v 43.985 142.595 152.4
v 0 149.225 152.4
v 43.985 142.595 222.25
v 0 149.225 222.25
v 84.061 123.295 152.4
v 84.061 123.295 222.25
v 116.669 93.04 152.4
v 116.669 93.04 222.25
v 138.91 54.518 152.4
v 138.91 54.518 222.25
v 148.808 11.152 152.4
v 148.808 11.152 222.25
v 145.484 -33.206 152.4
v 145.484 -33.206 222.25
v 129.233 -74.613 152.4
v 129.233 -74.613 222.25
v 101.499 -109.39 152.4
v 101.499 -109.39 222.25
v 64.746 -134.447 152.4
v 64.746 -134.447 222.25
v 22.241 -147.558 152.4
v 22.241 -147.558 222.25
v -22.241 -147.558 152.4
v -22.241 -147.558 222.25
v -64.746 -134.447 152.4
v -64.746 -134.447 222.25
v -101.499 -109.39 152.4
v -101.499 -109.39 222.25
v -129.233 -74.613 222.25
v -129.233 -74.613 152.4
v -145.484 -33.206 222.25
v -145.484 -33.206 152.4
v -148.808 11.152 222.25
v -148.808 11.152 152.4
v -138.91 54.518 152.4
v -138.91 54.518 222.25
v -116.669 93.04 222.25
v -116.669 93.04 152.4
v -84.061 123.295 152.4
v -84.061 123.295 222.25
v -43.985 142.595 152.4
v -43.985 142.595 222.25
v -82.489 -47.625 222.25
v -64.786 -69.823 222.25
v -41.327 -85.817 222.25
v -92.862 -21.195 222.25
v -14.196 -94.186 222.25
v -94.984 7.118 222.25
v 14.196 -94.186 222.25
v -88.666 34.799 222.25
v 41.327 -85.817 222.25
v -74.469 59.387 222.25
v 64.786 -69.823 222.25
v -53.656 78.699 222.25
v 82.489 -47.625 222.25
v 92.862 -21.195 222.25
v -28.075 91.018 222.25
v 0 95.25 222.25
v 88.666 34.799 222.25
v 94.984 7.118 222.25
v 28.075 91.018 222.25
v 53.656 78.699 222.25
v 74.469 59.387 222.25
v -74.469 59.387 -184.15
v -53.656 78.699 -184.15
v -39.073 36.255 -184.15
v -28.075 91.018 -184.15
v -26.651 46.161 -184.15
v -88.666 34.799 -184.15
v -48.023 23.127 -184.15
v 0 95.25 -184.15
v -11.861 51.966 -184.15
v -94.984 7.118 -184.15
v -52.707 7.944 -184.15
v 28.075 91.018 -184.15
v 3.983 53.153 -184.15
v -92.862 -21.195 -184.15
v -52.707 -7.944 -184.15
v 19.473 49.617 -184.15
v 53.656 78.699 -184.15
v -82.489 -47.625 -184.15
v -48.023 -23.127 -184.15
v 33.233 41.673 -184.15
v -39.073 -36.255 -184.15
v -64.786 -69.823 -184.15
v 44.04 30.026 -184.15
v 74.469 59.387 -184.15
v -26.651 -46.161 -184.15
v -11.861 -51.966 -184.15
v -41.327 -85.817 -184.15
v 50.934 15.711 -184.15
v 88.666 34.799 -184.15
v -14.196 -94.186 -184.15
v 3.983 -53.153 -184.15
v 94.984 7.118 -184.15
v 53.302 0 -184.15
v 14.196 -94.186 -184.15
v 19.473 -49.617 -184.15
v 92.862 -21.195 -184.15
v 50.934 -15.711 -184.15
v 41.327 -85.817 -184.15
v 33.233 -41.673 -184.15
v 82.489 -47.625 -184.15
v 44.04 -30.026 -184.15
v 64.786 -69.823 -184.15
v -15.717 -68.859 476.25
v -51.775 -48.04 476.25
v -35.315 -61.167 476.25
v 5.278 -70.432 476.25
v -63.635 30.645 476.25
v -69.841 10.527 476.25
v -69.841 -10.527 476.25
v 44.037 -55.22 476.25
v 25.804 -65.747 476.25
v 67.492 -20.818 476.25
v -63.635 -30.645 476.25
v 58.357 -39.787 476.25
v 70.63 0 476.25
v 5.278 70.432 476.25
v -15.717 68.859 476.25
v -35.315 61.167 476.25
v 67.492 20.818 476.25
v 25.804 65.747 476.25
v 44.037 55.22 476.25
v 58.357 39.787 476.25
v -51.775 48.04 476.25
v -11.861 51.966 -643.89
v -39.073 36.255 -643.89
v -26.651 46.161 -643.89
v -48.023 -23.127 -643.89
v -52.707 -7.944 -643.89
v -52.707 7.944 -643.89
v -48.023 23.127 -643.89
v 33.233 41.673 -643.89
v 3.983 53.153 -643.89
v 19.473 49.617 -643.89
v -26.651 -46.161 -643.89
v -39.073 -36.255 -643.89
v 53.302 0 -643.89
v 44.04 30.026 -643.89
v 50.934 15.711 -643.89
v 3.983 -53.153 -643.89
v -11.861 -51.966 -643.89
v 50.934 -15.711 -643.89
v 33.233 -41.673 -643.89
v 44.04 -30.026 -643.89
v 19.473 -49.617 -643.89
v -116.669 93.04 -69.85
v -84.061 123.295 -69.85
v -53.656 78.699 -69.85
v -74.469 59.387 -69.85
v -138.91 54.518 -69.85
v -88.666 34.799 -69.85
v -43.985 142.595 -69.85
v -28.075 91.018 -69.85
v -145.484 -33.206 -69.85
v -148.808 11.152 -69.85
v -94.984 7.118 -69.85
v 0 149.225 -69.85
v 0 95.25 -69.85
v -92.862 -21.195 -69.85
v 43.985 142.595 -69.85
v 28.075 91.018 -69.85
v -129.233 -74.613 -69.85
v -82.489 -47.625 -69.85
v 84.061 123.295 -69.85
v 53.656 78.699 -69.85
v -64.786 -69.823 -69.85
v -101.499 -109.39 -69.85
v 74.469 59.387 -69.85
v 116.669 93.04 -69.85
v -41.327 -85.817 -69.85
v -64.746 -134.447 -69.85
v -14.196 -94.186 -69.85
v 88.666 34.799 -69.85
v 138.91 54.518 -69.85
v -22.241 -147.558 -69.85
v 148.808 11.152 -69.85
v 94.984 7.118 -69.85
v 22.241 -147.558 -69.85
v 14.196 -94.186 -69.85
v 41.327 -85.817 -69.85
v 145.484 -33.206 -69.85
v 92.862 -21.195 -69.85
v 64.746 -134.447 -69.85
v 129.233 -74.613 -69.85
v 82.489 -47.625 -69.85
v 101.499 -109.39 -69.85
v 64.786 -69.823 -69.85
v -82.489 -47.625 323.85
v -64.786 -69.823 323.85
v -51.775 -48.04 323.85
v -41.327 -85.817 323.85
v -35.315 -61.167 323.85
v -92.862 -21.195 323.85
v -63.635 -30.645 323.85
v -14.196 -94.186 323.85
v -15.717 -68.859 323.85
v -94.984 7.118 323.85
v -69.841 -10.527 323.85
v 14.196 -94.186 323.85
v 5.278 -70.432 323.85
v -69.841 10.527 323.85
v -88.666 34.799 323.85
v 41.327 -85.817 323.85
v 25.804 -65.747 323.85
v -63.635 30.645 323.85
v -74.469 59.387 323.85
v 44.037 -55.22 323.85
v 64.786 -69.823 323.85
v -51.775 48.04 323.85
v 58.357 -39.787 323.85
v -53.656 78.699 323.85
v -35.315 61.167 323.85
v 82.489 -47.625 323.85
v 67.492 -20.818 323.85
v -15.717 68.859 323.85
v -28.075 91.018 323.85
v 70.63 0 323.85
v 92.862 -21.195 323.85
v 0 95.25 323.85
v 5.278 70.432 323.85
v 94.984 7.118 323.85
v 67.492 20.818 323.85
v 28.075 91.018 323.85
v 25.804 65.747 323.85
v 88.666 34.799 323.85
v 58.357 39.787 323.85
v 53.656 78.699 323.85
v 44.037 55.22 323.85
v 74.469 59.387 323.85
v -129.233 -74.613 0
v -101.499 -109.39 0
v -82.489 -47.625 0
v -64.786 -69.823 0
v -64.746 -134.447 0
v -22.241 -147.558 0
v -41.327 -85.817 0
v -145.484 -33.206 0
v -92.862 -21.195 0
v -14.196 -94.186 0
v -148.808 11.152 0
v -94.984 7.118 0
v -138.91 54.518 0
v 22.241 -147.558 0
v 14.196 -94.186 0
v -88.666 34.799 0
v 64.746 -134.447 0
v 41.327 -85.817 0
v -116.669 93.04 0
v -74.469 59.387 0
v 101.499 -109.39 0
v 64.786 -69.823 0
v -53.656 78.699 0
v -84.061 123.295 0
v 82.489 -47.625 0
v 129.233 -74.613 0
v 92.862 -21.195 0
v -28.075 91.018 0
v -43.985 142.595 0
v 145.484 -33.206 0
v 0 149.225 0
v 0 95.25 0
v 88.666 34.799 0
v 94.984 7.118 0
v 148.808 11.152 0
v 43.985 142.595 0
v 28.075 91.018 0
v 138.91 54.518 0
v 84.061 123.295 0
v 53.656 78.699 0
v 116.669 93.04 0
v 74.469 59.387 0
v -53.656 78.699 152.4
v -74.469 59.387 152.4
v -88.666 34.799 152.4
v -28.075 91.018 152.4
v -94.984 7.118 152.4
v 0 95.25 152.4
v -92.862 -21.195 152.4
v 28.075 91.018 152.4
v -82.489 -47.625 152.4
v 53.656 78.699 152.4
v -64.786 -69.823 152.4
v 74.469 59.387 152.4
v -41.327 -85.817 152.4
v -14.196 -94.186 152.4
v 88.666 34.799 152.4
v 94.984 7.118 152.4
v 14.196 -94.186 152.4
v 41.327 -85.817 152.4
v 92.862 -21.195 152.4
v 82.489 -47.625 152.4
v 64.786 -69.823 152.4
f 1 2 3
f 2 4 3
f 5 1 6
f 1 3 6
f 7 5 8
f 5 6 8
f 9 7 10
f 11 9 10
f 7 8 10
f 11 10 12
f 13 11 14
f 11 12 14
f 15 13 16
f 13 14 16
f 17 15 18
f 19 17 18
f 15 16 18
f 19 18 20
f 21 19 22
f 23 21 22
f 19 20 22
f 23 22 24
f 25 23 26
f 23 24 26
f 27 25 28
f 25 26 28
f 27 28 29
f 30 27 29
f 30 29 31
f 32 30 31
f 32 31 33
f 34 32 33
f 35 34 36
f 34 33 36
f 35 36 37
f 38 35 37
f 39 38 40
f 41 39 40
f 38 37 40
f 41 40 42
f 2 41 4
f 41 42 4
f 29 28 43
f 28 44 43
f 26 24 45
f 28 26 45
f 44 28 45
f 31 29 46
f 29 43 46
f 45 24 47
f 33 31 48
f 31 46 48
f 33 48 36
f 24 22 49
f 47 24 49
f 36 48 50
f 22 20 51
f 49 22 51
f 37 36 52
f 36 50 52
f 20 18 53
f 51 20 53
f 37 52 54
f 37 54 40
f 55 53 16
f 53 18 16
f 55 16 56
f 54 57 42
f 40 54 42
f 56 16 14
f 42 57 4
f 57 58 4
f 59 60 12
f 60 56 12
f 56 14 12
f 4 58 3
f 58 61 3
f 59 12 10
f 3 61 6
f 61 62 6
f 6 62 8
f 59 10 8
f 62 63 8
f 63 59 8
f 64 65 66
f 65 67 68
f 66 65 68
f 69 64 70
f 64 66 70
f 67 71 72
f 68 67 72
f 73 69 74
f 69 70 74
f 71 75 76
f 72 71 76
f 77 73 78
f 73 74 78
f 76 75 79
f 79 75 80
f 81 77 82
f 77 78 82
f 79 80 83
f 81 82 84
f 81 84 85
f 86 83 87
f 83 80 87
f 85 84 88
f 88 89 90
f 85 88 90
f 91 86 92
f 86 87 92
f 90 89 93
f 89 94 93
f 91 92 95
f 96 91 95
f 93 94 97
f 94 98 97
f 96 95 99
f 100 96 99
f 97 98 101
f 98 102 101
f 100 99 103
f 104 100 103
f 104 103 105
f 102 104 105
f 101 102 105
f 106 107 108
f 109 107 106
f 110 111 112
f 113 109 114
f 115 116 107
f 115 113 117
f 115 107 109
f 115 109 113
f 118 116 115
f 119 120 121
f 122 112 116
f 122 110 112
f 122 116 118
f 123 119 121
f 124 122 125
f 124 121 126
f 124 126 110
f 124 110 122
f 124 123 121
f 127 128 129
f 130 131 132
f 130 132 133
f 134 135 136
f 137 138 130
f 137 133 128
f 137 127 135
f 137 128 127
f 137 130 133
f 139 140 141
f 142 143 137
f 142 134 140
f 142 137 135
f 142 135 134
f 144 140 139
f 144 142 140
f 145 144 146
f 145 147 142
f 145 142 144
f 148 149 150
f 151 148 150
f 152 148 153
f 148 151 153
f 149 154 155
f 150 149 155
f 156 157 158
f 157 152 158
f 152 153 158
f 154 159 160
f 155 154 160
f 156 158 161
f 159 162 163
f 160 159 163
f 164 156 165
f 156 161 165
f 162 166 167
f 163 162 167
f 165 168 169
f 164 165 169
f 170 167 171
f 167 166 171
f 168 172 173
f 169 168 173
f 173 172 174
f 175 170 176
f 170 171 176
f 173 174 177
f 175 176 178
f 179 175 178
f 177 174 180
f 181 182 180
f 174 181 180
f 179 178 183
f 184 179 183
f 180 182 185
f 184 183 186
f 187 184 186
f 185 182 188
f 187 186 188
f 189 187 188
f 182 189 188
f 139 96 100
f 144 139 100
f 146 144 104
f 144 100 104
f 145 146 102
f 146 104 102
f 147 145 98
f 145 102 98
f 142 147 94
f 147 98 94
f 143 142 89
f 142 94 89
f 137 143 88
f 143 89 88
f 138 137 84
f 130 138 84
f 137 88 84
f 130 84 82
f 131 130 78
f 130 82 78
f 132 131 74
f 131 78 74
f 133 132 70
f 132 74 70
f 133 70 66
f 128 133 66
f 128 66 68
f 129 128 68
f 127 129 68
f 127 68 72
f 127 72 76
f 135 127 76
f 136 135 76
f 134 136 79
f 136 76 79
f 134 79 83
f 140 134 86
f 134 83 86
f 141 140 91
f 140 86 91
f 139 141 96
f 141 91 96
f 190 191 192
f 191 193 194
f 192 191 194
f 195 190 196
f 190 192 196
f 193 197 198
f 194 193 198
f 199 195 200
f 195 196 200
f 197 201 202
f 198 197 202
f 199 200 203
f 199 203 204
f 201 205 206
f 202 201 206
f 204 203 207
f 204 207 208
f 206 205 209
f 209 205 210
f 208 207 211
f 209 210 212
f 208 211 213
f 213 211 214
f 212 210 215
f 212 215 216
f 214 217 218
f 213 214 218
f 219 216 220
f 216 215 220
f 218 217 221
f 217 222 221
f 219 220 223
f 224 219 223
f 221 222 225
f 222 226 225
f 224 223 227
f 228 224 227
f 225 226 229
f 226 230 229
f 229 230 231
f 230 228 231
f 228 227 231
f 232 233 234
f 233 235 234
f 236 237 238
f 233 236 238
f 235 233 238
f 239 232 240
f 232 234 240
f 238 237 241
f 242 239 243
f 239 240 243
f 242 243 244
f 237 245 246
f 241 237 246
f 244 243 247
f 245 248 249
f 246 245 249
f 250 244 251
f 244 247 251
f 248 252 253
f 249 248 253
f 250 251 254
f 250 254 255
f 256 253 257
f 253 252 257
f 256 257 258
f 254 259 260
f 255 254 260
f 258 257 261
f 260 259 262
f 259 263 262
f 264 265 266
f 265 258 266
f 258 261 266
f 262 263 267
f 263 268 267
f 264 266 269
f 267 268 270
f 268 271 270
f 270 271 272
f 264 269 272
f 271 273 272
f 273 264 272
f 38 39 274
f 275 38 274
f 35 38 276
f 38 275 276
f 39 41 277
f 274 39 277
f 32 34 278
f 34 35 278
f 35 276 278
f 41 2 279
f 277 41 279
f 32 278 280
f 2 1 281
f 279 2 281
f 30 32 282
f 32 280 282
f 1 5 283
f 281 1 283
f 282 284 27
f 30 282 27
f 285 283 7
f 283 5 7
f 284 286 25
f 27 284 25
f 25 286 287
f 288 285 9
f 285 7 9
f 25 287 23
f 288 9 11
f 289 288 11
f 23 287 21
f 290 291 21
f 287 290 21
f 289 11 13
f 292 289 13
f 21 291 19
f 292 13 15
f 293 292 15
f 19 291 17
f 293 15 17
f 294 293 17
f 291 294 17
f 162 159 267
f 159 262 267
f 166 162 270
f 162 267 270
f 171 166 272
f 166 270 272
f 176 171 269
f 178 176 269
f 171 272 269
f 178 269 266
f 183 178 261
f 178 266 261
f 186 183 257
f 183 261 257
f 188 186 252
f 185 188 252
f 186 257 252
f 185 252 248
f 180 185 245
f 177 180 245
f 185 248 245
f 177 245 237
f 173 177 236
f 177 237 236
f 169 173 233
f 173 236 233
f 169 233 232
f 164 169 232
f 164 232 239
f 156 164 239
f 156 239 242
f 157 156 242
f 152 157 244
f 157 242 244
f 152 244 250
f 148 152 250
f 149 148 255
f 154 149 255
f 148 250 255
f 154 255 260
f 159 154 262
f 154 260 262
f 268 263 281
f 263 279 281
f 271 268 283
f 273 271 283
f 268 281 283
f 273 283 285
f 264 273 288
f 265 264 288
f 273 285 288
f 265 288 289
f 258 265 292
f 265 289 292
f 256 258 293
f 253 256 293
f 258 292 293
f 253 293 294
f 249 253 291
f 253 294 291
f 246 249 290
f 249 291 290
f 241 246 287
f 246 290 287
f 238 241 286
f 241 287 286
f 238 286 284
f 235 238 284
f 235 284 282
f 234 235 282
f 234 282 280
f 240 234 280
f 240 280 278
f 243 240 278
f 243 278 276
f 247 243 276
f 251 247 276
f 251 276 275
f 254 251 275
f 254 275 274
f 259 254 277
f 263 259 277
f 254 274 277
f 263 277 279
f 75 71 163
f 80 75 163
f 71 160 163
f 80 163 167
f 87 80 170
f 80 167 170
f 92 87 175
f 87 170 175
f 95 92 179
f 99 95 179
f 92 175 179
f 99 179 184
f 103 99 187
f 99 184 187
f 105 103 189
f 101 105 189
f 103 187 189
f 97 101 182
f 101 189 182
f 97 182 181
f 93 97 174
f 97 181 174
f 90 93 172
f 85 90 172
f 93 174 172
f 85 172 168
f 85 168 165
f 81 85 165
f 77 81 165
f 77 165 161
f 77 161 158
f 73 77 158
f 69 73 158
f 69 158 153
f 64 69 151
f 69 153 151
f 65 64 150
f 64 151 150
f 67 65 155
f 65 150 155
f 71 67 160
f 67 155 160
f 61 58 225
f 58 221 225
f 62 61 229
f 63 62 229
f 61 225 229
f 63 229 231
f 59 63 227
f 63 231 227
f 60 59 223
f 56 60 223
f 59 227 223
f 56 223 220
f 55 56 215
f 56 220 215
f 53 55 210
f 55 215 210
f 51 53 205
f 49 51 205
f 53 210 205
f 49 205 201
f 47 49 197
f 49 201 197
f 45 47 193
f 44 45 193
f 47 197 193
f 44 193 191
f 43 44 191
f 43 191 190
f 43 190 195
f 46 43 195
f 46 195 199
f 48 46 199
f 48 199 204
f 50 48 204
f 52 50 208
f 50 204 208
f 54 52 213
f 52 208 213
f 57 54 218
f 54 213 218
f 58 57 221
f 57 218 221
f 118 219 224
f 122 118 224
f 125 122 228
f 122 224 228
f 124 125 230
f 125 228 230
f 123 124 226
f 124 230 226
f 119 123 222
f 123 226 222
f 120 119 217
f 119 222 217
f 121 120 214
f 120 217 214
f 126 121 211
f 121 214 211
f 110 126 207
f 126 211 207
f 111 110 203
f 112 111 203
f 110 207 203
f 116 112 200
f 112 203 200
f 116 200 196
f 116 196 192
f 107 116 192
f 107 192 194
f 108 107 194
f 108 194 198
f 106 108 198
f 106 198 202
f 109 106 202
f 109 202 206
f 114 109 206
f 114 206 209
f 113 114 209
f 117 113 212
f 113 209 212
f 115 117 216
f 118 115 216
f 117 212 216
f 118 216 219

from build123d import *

# Parameters (mm, degrees)
F2_R     = 70.629531
F3_DEPTH = 152.4
F4_R     = 53.301947
F5_DEPTH = 459.74


with BuildPart() as f1:
    # F0 (on Right) → F1 (revolve)
    with BuildSketch(Plane.YZ):
        Polygon((95.25, 323.85), (0, 323.85), (0, -184.15), (95.25, -184.15), (95.25, -69.85), (149.225, -69.85), (149.225, 0), (95.25, 0), (95.25, 152.4), (149.225, 152.4), (149.225, 222.25), (95.25, 222.25), align=None)
    revolve(axis=Axis((0, 0, 7.681185), (0, 0, -1)))

    # F2 (on face) → F3 (join)
    with BuildSketch(Plane.XY.offset(323.85)):
        Circle(F2_R)
    extrude(amount=F3_DEPTH)

    # F4 (on face) → F5 (join)
    with BuildSketch(Plane(origin=(0, 0, -184.15), x_dir=(1, 0, 0), z_dir=(0, 0, -1))):
        Circle(F4_R)
    extrude(amount=F5_DEPTH)


solid = f1.part
